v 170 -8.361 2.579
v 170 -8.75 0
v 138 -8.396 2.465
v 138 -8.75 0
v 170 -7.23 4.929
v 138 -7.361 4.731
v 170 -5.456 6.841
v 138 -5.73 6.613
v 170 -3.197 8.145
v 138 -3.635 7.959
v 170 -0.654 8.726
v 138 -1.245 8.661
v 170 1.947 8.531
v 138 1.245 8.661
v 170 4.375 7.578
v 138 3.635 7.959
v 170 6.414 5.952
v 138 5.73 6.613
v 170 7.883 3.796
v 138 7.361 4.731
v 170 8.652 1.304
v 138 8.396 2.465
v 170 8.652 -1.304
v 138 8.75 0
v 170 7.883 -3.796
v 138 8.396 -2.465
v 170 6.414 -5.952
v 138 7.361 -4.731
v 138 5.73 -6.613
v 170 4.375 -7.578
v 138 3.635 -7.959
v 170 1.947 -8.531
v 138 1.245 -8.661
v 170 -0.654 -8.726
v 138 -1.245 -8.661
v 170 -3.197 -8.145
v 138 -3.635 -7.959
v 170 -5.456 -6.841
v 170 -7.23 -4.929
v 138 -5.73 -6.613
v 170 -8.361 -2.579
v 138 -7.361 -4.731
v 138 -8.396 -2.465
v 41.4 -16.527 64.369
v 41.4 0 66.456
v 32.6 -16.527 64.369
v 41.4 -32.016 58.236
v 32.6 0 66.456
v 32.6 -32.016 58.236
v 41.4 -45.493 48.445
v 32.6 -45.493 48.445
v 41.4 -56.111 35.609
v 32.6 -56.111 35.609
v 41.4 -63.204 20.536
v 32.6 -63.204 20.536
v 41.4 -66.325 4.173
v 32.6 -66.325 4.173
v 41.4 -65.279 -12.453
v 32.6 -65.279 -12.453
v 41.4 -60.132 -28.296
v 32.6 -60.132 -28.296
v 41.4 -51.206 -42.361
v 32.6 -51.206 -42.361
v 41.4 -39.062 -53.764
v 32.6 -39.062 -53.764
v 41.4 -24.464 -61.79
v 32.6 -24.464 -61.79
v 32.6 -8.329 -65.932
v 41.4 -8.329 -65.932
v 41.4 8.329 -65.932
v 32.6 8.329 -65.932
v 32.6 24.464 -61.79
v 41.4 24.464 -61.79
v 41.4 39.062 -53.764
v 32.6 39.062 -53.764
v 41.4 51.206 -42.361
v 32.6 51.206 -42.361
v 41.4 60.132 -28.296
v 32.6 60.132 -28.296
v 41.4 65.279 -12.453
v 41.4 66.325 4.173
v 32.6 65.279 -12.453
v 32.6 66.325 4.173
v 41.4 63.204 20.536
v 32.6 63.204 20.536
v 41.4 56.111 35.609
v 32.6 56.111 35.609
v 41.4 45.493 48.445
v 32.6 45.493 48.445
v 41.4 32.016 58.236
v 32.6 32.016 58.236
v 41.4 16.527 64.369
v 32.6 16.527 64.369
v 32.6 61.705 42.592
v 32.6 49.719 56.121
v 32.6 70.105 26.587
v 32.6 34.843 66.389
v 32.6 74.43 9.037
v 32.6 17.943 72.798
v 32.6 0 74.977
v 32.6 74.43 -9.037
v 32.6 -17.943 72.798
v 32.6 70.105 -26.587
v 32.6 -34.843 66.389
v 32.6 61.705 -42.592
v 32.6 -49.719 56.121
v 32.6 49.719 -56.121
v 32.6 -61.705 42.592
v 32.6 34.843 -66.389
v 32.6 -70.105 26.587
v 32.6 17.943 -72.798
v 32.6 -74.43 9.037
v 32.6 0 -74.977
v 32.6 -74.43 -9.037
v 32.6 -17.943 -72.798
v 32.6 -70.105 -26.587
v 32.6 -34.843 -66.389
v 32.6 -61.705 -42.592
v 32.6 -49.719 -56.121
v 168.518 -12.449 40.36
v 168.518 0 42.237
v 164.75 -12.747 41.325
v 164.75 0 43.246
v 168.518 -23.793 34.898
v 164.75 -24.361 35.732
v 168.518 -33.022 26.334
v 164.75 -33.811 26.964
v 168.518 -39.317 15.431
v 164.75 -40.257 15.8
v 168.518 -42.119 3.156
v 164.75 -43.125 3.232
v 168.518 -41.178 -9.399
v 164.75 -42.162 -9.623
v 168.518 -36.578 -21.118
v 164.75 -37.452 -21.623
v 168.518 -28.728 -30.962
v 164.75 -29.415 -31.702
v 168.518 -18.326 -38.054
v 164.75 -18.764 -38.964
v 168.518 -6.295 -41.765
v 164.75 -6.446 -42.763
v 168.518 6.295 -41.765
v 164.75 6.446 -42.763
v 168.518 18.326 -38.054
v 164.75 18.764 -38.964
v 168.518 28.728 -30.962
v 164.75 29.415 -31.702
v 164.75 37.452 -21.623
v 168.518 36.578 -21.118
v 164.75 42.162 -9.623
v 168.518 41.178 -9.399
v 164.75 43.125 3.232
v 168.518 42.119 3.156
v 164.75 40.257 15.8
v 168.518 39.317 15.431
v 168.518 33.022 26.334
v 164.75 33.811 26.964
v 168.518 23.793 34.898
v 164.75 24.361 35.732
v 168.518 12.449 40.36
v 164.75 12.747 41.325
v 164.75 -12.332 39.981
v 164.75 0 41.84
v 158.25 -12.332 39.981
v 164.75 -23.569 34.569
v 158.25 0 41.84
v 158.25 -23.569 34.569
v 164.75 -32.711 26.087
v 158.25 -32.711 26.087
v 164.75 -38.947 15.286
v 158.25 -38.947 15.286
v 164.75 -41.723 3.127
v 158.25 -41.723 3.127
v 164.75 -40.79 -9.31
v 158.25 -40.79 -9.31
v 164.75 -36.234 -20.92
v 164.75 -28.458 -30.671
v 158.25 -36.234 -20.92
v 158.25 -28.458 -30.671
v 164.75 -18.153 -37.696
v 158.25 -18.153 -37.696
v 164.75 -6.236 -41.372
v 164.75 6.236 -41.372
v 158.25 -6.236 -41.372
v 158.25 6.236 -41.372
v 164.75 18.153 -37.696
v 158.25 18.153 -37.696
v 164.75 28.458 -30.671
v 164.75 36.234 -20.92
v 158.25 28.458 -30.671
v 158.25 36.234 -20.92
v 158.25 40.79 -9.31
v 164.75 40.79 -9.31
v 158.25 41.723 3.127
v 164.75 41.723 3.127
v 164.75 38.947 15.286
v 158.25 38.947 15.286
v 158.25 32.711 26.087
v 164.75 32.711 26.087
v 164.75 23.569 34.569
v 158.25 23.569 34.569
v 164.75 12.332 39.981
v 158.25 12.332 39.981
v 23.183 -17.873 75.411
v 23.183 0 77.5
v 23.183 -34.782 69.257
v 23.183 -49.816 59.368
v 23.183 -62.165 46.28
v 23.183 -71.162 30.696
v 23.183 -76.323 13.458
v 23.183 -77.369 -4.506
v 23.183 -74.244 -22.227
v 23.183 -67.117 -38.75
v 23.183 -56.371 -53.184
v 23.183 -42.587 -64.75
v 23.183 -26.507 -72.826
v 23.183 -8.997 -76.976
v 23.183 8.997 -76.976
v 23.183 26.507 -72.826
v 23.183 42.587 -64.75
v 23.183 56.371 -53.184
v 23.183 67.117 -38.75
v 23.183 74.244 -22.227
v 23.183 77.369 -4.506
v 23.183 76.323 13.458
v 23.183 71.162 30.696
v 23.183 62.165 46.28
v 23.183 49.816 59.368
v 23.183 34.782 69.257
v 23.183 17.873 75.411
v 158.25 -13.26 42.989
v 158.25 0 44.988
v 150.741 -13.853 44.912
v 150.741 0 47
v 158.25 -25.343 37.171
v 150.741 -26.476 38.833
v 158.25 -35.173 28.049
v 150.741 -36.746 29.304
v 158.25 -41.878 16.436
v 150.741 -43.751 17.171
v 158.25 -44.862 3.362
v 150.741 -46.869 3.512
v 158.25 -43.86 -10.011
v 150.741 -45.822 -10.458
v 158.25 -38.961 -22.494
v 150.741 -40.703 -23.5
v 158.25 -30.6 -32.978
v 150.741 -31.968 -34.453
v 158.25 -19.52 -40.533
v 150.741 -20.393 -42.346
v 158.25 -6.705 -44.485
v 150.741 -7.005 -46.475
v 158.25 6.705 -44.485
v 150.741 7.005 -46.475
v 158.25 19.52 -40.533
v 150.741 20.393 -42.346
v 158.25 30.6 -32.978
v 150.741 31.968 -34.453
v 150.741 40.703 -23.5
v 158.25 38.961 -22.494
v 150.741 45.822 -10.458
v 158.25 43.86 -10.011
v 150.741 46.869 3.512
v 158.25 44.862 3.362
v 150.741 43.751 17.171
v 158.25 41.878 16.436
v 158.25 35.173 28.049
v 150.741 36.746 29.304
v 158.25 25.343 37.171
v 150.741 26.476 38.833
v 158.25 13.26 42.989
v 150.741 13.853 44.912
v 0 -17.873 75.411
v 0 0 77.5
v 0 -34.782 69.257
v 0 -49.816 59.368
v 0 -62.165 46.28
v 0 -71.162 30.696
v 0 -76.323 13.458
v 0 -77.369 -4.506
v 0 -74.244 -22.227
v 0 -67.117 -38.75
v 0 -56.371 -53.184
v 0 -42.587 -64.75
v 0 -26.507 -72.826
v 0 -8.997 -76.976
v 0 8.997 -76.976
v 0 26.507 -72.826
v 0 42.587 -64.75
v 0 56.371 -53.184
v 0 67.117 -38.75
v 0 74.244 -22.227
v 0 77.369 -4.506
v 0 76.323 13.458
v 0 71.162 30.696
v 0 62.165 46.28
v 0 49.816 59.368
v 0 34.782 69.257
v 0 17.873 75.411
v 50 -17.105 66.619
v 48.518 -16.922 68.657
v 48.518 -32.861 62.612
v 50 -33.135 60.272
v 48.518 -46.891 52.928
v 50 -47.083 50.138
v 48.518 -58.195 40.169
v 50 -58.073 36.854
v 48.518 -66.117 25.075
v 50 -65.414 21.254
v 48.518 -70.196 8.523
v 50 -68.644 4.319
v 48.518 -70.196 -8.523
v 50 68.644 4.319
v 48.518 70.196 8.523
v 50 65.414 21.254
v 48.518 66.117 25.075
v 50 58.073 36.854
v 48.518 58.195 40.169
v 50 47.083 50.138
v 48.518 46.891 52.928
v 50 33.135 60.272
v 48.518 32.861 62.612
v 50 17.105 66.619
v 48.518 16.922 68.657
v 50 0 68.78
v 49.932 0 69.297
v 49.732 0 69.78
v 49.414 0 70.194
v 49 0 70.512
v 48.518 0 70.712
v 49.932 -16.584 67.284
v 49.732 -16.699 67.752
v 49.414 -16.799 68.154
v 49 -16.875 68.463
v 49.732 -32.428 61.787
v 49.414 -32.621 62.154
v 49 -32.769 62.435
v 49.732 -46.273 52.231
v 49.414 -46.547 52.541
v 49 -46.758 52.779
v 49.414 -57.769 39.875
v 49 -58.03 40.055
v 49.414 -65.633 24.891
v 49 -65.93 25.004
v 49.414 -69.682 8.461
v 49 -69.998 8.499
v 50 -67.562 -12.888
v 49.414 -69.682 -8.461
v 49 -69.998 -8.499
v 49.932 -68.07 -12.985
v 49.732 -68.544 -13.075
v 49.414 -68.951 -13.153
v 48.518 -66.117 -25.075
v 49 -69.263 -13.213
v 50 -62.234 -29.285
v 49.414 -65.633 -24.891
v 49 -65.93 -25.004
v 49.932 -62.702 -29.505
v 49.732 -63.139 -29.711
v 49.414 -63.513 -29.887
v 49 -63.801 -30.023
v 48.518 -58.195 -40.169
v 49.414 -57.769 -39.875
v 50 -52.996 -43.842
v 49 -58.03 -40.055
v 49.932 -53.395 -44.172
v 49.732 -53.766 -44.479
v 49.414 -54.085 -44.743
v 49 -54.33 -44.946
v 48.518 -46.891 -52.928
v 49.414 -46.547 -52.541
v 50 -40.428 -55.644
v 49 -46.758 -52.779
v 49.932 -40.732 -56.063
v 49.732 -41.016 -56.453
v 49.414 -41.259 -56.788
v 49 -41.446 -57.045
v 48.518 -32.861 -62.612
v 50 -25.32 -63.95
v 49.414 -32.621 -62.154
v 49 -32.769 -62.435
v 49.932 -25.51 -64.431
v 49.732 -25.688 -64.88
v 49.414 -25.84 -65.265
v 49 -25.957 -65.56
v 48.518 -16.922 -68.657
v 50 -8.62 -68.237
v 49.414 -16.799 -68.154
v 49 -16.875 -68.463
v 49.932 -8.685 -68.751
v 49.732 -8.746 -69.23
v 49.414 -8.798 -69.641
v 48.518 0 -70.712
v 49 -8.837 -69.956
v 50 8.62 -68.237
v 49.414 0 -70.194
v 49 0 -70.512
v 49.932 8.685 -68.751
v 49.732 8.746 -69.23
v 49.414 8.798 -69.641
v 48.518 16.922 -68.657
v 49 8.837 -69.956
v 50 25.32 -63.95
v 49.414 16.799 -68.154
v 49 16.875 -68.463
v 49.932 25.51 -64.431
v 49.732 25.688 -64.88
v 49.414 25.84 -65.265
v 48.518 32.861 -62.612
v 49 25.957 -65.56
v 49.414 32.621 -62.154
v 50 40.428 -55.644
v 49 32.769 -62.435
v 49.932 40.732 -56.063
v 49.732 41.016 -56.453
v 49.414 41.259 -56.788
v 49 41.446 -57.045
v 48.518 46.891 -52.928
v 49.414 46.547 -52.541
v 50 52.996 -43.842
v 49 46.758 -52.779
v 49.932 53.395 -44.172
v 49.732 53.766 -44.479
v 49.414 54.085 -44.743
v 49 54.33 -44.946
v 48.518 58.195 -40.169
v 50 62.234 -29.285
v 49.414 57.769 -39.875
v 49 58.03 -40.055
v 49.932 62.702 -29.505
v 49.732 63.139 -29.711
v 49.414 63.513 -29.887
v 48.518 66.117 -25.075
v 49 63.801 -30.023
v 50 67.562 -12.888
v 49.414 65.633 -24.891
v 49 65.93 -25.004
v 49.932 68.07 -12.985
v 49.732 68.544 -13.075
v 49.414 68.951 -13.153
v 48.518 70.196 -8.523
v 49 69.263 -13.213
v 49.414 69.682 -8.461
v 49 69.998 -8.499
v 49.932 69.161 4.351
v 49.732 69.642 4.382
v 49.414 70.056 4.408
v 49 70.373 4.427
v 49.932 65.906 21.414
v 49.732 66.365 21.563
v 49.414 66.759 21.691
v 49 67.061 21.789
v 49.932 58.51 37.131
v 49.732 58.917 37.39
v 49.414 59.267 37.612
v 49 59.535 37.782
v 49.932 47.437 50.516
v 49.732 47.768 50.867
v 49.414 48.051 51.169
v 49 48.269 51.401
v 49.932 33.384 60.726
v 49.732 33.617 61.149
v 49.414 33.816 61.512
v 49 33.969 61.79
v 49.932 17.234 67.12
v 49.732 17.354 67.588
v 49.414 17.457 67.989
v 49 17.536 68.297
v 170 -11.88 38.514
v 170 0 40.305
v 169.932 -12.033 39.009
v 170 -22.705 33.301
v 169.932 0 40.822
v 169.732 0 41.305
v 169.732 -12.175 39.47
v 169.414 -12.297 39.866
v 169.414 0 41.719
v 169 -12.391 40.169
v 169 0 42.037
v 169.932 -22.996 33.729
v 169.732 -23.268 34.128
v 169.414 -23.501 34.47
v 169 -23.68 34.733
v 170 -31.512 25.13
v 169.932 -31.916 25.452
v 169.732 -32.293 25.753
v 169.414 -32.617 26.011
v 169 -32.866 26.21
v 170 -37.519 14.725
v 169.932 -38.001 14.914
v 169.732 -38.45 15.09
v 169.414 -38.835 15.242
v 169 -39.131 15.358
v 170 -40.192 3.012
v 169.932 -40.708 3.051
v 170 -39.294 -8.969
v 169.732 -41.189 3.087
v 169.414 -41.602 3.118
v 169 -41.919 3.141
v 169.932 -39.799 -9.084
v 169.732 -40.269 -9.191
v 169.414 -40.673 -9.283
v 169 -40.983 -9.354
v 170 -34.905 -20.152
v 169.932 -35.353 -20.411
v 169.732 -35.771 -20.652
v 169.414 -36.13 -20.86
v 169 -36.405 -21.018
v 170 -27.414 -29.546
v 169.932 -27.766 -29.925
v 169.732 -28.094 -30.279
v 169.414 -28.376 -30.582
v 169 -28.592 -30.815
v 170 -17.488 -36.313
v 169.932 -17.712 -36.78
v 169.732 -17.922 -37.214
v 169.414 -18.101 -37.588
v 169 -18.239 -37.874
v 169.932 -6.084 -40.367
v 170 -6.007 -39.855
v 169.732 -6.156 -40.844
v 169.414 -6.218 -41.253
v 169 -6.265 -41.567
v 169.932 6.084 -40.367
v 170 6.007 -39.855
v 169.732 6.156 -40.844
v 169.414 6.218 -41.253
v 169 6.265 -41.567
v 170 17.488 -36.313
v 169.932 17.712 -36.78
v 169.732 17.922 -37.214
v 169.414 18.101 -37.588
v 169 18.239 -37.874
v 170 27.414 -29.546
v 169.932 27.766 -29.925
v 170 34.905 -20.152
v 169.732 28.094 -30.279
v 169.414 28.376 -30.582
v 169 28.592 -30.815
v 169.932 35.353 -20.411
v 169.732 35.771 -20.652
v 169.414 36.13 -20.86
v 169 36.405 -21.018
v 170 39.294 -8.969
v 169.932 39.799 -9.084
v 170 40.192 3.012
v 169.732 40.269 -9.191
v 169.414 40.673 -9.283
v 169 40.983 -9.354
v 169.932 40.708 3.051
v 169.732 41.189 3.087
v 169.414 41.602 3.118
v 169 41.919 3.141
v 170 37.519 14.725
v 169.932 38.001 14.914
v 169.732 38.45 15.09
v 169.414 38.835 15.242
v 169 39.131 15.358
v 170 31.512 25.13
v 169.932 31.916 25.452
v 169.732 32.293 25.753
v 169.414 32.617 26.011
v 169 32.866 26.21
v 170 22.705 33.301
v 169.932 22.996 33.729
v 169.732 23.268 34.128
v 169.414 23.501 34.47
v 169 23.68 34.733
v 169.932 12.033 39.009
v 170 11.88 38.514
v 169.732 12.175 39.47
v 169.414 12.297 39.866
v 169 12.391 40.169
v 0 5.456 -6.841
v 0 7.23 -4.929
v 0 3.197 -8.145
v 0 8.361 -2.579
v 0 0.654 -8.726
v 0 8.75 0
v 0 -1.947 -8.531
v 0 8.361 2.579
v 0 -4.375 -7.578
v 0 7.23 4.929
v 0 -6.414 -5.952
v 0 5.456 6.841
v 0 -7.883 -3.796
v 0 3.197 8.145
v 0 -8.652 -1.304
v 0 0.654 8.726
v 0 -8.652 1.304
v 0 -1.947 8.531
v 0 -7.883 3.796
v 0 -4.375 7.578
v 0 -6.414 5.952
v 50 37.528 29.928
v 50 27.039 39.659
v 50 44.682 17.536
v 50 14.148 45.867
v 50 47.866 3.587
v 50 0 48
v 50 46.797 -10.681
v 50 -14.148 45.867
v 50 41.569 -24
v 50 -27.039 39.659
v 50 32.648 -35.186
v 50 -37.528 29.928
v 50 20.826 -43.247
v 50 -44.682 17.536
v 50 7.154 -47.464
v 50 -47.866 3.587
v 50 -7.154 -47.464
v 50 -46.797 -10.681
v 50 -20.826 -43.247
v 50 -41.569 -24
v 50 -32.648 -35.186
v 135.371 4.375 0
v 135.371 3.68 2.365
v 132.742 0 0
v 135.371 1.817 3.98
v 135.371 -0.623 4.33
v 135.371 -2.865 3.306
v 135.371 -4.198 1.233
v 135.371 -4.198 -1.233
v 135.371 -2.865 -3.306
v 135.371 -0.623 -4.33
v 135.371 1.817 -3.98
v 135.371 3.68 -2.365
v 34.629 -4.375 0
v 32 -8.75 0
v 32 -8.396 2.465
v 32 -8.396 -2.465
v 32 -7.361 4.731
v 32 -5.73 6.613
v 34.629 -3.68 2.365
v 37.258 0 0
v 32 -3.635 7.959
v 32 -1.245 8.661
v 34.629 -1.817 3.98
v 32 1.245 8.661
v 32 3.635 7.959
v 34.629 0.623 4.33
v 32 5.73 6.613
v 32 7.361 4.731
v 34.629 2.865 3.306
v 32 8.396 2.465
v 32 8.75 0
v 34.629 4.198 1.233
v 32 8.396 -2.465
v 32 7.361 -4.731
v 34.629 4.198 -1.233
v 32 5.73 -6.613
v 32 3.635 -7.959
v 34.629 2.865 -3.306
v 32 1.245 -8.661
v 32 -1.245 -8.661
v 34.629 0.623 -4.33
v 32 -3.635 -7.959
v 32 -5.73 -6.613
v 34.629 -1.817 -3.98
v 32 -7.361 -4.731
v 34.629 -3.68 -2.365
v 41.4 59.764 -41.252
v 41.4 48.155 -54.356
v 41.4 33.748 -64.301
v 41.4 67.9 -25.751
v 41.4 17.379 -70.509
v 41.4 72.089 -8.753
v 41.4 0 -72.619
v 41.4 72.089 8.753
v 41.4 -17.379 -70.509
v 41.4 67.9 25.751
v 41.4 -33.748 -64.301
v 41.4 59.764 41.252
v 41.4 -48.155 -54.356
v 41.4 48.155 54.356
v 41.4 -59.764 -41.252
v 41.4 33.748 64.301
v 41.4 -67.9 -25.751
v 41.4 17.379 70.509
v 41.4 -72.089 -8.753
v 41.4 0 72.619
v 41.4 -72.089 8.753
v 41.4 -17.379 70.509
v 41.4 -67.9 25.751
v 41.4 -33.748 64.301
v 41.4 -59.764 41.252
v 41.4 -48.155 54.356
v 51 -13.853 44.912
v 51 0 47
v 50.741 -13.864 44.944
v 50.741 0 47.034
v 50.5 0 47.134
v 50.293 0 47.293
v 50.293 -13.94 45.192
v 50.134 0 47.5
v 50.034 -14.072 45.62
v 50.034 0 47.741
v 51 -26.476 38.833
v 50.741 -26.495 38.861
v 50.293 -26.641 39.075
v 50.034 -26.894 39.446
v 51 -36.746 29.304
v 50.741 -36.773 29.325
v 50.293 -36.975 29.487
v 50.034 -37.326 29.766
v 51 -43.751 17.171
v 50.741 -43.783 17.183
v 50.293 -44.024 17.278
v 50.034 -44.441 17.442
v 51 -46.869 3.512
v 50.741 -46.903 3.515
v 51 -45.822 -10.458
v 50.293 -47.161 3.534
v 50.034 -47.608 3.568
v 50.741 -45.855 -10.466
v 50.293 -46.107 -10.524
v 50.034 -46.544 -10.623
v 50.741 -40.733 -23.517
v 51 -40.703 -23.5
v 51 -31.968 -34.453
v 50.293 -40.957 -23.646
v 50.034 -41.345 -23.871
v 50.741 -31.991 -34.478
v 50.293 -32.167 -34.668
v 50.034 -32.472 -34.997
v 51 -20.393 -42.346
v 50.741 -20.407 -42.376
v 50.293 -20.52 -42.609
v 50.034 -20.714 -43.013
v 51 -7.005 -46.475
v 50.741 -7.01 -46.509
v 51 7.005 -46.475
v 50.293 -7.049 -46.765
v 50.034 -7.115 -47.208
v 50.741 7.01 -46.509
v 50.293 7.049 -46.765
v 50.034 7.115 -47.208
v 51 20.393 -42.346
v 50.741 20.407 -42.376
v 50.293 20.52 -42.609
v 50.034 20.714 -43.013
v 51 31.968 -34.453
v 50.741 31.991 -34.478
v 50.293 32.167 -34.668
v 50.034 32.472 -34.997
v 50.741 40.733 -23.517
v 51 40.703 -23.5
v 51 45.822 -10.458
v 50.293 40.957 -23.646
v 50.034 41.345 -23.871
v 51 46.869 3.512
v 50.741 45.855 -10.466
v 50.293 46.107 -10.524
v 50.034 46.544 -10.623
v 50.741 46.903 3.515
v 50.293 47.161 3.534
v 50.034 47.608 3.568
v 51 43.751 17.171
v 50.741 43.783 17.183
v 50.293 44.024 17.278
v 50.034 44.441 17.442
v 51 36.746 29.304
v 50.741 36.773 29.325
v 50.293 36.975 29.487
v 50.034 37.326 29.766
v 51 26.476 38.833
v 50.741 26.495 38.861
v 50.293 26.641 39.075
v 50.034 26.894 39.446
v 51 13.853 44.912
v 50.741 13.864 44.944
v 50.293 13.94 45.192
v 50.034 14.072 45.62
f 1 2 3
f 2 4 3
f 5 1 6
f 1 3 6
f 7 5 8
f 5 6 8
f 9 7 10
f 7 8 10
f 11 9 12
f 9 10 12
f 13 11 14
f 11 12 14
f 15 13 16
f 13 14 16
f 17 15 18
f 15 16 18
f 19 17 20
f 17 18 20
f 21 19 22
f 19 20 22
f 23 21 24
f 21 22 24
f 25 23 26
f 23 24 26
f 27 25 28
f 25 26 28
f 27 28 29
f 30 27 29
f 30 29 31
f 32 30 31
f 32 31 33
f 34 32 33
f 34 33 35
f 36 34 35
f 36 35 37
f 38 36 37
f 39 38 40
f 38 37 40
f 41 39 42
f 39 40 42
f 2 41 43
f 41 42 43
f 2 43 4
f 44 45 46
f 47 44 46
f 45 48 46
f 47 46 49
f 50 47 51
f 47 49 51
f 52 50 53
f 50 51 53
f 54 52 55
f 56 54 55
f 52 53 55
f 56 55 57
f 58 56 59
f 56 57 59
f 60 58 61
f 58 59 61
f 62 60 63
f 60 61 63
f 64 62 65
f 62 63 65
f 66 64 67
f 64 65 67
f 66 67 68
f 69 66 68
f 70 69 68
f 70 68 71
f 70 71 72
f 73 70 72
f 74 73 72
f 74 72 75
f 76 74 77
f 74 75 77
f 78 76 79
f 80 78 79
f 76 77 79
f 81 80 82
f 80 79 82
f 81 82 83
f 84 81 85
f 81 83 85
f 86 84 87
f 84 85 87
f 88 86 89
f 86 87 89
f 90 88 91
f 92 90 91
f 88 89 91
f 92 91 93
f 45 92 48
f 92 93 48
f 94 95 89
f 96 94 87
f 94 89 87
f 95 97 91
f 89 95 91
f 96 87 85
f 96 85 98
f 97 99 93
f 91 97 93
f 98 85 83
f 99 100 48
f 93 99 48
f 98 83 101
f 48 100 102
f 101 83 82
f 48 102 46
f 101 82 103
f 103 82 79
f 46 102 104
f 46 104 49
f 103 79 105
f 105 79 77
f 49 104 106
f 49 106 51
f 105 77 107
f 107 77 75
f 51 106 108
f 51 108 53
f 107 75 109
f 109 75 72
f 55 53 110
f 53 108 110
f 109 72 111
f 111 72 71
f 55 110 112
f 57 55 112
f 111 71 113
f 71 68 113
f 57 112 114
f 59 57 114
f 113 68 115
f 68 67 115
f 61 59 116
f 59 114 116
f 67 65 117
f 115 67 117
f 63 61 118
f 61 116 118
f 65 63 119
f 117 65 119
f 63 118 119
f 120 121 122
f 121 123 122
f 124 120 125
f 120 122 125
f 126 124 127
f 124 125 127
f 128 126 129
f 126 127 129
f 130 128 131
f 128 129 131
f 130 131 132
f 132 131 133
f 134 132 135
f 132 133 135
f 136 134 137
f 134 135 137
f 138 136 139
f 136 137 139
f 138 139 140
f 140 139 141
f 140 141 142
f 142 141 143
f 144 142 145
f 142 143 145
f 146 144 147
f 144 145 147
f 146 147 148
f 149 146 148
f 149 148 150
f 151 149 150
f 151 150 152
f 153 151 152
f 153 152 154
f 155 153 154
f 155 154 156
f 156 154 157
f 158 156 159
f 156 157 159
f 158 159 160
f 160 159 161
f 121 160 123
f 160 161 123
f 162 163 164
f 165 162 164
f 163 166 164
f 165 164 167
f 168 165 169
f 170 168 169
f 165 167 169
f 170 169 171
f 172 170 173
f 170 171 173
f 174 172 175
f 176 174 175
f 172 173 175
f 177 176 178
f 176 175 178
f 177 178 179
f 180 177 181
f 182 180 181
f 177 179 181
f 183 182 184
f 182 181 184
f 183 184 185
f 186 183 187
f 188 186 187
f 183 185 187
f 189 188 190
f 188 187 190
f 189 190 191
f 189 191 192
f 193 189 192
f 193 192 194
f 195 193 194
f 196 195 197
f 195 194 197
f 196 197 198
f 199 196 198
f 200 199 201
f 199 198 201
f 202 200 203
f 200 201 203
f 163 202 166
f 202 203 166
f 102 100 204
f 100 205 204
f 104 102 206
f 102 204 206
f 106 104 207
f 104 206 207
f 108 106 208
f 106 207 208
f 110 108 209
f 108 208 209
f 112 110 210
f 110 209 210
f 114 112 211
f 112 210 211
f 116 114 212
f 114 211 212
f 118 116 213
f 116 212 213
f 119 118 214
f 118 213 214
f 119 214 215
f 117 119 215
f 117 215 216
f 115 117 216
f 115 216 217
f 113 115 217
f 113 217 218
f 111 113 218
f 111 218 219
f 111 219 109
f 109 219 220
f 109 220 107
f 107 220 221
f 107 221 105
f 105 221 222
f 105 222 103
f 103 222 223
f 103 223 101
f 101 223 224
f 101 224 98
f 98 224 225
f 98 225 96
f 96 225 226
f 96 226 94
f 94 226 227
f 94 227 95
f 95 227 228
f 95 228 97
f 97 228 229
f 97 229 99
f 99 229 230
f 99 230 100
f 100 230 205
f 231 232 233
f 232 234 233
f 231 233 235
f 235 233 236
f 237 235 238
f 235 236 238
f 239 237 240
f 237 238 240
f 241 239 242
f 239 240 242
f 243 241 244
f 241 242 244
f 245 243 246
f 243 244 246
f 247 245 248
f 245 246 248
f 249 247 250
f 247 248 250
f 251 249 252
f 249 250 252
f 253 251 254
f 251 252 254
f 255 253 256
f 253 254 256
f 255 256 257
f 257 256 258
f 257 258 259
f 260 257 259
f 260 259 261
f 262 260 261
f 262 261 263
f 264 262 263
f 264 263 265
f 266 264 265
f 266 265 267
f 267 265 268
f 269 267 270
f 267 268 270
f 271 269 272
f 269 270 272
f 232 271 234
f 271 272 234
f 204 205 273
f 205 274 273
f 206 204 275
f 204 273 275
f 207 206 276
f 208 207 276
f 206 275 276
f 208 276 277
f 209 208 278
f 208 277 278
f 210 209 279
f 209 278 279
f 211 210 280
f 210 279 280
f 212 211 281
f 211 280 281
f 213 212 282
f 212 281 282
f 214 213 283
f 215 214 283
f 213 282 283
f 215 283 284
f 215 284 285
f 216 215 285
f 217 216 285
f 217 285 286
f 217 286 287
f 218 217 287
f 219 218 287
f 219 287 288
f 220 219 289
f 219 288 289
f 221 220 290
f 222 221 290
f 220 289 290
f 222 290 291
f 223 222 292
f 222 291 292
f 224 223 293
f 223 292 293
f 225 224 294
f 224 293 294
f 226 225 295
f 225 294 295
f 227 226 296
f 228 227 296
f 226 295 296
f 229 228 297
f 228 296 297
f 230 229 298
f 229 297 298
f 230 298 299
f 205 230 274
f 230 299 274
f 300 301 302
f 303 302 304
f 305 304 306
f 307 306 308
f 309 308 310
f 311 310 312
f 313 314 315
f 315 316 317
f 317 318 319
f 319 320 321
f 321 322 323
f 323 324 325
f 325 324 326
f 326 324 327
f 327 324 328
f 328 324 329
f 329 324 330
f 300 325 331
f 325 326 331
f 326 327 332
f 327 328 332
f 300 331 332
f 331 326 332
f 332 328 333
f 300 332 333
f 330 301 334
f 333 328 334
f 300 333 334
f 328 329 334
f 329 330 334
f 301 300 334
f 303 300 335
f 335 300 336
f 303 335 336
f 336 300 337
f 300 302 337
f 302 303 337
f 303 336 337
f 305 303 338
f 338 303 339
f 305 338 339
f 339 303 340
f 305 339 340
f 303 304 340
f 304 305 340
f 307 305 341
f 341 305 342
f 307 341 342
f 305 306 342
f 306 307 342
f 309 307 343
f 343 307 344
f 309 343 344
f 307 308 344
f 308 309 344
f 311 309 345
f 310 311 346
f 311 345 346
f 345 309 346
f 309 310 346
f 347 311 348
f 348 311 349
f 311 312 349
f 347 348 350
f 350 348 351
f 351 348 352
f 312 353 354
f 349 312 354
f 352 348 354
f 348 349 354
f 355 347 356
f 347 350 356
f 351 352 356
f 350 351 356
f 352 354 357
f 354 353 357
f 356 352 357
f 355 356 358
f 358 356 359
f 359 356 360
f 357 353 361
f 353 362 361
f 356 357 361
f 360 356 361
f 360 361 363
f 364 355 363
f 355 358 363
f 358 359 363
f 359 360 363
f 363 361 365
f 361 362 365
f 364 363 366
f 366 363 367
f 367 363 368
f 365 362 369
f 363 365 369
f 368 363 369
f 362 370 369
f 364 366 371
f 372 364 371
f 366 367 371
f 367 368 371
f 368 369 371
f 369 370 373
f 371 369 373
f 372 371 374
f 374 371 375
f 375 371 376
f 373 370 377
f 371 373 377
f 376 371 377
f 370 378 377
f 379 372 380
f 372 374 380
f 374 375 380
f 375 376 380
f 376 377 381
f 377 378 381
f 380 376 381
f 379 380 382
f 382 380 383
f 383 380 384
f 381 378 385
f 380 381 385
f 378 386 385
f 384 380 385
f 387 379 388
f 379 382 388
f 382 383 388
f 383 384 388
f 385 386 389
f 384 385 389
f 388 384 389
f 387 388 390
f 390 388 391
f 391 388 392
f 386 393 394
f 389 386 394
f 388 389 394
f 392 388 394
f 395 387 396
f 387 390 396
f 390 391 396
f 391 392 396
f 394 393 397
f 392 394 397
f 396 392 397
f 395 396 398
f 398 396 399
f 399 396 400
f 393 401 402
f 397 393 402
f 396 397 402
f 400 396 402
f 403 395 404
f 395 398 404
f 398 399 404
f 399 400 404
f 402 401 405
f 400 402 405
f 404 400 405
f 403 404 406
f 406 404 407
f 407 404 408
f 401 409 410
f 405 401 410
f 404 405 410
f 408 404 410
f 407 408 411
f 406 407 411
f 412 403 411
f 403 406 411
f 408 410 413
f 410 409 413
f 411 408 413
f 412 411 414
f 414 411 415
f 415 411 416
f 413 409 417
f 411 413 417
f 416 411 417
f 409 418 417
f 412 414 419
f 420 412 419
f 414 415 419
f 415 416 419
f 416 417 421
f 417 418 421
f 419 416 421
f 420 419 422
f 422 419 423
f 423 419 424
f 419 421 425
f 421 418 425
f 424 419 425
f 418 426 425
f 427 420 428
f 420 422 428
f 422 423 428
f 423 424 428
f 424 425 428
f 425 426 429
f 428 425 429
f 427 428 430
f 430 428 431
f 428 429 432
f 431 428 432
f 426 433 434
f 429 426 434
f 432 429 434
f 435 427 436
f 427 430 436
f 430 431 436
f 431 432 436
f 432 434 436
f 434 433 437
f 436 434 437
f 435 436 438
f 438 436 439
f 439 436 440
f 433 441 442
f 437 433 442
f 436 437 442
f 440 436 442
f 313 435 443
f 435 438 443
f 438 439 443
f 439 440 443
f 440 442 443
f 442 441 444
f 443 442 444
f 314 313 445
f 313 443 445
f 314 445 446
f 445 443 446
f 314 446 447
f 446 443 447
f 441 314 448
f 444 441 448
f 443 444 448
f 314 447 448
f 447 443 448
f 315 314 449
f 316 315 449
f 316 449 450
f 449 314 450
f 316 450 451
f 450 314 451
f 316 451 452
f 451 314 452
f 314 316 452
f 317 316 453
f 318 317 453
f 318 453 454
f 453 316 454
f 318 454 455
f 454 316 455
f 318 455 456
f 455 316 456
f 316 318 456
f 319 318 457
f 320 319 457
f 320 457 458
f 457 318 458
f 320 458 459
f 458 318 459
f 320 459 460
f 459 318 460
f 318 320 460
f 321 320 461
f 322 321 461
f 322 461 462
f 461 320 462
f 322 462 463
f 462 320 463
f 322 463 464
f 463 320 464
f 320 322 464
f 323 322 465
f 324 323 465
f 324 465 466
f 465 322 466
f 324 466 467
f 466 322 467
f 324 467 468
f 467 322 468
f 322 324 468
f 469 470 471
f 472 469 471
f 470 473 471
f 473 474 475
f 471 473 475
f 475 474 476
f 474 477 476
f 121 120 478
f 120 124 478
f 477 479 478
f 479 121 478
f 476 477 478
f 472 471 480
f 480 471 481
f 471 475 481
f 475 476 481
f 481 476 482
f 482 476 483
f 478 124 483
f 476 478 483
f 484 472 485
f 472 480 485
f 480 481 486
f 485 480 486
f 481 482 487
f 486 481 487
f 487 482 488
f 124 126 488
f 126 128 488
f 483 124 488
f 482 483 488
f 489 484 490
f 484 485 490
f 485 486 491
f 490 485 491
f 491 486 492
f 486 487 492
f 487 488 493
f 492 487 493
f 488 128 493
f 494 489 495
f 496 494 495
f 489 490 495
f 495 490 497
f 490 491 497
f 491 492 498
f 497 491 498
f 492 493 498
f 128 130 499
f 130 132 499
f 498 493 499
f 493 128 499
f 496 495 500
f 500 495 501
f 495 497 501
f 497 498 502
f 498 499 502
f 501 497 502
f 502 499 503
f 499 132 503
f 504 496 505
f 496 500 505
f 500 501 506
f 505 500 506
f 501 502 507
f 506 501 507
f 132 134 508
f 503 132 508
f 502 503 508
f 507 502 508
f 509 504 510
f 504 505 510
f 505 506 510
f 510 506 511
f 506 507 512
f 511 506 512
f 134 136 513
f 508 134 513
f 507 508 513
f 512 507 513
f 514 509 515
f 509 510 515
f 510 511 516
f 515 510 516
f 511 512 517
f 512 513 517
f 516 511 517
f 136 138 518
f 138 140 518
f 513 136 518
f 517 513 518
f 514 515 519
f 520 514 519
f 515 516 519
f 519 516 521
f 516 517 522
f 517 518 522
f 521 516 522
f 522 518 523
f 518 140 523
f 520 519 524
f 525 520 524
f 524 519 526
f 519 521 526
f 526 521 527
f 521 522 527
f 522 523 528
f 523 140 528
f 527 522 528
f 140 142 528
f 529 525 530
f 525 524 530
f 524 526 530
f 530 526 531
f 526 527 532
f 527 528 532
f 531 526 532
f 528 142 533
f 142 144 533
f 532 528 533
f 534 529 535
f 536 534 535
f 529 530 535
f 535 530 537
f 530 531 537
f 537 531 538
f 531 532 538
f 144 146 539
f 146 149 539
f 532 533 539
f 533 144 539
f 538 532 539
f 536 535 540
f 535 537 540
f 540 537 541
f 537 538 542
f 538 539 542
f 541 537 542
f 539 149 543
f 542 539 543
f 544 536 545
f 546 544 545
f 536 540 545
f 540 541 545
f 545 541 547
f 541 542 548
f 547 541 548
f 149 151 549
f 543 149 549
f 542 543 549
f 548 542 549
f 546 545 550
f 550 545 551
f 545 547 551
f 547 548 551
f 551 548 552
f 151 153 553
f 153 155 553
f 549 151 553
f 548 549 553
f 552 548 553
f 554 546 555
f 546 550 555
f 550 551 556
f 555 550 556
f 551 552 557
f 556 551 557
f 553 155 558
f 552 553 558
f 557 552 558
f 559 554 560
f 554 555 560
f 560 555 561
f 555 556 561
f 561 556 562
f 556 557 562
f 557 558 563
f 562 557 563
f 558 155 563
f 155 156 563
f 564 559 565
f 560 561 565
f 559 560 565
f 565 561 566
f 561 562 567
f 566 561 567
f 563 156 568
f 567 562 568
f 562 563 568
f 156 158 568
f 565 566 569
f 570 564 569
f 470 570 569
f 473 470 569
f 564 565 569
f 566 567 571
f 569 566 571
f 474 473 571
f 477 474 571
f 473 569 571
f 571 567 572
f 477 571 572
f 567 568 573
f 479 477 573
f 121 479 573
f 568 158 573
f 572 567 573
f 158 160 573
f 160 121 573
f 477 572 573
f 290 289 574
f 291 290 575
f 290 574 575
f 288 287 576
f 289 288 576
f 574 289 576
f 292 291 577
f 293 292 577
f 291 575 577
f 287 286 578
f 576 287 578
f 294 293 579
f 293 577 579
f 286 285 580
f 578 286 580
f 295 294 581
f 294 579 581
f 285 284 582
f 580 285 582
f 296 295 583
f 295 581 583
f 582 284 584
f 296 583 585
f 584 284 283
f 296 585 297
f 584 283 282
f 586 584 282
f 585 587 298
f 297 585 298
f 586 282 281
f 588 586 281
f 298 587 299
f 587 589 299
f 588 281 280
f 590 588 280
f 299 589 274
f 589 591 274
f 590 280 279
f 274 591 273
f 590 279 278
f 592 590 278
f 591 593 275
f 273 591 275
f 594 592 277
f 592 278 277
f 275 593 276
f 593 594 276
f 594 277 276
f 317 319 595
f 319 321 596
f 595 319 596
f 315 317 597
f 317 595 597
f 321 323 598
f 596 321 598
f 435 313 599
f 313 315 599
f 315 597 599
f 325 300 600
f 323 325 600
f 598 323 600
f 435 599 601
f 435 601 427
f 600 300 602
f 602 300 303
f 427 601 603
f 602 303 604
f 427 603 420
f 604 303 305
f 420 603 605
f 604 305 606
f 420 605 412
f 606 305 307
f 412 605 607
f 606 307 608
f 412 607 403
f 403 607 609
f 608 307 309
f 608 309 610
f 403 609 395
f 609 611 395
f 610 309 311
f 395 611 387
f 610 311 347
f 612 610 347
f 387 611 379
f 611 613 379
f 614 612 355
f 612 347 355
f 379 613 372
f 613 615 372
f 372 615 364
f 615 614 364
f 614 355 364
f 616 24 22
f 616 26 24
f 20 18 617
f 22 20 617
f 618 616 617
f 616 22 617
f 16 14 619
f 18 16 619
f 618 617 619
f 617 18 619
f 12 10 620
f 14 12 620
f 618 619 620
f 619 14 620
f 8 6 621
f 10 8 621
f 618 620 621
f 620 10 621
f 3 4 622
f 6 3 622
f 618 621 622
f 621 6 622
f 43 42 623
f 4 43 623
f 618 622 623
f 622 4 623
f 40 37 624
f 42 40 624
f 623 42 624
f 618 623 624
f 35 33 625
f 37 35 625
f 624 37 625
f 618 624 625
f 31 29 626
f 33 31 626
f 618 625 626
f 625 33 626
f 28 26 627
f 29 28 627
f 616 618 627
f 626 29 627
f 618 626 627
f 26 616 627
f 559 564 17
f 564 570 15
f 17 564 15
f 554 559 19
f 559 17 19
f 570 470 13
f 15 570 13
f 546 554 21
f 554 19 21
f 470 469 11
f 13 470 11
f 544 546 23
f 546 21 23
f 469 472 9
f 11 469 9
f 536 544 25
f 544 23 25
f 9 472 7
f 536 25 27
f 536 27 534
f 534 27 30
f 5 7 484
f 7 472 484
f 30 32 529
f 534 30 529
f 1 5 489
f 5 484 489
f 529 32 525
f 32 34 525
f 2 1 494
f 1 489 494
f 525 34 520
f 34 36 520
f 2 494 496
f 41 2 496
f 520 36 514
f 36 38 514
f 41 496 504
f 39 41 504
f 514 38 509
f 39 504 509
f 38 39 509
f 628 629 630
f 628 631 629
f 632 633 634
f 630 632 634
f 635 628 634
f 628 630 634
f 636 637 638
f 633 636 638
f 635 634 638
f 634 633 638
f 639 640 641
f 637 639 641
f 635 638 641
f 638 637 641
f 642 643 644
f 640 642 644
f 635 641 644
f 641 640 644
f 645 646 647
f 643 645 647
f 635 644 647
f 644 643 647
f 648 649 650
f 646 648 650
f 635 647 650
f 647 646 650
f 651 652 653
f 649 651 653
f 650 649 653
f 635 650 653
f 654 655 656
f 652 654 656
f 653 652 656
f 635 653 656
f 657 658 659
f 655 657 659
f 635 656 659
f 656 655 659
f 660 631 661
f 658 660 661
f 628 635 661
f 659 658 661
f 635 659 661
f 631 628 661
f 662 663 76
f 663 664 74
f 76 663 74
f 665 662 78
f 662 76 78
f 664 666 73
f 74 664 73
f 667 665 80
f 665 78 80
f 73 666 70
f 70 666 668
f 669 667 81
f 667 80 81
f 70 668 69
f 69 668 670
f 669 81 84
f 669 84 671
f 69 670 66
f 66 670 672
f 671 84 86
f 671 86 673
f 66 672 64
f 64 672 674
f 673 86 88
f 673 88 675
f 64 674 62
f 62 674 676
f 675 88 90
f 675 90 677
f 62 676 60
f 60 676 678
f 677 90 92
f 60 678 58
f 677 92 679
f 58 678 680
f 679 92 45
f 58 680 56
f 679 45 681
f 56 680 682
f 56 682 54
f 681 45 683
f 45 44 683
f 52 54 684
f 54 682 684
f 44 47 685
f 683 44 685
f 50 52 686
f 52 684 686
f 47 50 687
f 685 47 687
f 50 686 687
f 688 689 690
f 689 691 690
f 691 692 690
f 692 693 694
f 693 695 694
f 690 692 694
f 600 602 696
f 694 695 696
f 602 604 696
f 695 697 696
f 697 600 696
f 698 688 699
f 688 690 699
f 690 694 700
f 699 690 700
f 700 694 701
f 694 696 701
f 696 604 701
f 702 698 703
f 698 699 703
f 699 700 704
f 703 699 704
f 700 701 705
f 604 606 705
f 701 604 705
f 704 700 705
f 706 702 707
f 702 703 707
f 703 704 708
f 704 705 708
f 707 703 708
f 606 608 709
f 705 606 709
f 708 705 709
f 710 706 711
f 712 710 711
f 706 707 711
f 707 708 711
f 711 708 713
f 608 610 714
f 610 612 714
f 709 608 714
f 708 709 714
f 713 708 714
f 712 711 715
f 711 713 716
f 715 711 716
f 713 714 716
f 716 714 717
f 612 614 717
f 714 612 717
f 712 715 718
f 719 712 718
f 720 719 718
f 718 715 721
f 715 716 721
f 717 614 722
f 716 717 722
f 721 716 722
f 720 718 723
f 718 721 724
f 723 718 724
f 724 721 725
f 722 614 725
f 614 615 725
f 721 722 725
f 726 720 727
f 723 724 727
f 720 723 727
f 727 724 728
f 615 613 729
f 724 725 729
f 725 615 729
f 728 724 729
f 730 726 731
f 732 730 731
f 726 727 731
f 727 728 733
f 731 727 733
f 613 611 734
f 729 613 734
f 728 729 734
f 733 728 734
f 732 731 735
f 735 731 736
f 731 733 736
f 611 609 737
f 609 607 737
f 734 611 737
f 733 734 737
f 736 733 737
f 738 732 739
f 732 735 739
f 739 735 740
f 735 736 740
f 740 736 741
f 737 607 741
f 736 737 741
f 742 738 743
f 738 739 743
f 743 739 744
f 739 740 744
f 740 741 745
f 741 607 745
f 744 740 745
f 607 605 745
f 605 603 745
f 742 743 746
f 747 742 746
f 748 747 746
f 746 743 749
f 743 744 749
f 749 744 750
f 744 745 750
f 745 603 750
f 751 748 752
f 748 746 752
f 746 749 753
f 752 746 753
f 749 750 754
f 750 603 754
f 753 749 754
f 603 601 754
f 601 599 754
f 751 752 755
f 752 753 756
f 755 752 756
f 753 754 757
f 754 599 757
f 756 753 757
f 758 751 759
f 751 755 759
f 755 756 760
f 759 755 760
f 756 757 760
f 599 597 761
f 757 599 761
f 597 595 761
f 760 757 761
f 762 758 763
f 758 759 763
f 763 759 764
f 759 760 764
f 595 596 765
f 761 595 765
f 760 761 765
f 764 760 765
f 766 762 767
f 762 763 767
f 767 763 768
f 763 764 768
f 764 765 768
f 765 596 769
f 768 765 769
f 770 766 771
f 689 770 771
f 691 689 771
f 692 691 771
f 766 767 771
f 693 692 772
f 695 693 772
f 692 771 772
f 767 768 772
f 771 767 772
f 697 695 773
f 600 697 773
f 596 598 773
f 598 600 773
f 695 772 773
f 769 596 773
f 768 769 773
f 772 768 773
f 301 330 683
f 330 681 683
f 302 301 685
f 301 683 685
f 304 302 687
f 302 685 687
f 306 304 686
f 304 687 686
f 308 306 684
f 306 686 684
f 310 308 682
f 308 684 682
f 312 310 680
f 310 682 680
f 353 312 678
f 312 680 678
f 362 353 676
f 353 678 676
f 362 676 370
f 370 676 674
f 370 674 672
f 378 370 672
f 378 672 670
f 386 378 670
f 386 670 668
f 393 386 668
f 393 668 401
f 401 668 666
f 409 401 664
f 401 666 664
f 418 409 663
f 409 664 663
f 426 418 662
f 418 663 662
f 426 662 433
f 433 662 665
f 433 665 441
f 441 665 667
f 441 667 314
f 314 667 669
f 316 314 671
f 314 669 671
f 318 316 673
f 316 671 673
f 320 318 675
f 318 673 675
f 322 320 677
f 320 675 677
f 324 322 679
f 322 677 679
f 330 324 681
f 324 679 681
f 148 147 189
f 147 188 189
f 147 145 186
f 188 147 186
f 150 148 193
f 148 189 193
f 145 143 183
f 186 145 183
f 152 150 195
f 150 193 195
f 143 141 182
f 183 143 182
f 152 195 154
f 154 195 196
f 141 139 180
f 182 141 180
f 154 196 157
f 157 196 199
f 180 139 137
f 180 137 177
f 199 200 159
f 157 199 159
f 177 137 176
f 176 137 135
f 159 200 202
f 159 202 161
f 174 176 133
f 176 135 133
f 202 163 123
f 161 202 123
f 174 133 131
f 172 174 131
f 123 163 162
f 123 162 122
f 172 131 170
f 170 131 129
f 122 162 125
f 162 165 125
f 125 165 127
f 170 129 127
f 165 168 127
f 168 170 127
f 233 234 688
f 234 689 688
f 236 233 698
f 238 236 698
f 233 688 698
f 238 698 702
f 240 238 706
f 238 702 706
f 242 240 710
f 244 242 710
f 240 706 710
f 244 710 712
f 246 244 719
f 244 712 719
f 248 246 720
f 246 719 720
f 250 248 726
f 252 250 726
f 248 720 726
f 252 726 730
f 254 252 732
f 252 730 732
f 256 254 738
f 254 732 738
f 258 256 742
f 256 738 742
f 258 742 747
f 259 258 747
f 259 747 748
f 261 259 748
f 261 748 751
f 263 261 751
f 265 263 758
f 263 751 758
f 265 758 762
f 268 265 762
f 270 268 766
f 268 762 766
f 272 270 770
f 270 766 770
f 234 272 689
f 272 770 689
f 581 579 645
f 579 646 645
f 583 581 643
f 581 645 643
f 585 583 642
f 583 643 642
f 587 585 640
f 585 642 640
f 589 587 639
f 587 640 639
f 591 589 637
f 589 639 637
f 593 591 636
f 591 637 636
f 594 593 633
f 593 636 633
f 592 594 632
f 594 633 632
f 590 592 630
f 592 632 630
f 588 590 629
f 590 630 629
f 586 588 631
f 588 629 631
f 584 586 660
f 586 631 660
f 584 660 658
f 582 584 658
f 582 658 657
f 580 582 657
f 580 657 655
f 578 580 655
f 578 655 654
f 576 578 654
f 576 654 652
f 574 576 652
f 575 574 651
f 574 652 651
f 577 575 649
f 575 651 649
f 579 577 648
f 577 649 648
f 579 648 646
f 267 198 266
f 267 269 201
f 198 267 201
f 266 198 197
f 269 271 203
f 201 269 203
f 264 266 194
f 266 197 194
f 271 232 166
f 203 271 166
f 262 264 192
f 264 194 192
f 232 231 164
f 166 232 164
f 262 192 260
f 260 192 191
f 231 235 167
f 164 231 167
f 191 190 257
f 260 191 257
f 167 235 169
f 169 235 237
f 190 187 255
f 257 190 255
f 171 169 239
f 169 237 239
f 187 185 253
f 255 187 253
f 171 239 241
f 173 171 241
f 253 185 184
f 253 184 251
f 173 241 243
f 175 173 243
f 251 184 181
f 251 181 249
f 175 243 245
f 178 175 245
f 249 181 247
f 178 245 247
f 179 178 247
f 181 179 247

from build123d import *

# Parameters (mm, degrees)
F3_D     = 17.5
F3_DEPTH = 32
F3_TIP   = 5.2575304165
F5_D     = 17.5
F5_DEPTH = 32
F5_TIP   = 5.2575304165


with BuildPart() as f1:
    # F0 (on Front) → F1 (revolve)
    with BuildSketch(Plane.XZ):
        with BuildLine():
            Line((0, 77.5), (0, 0))
            Line((0, 0), (170, 0))
            Line((170, 0), (170, 40.304846024))
            ThreePointArc((170, 40.304846024), (169.5867066806, 41.5223688821), (168.5176380902, 42.2366976766))
            Line((168.5176380902, 42.2366976766), (164.75, 43.2462332603))
            Line((164.75, 43.2462332603), (164.75, 41.8395))
            Line((164.75, 41.8395), (158.25, 41.8395))
            Line((158.25, 41.8395), (158.25, 44.9879030111))
            Line((158.25, 44.9879030111), (150.7407518075, 47))
            Line((150.7407518075, 47), (51, 47))
            ThreePointArc((51, 47), (50.2928932188, 47.2928932188), (50, 48))
            Line((50, 48), (50, 68.7798354631))
            ThreePointArc((50, 68.7798354631), (49.5867066806, 69.9973583211), (48.5176380902, 70.7116871157))
            Line((48.5176380902, 70.7116871157), (41.4, 72.6188524939))
            Line((41.4, 72.6188524939), (41.4, 66.4565))
            Line((41.4, 66.4565), (32.6, 66.4565))
            Line((32.6, 66.4565), (32.6, 74.9768053873))
            Line((32.6, 74.9768053873), (23.1833095082, 77.5))
            Line((23.1833095082, 77.5), (0, 77.5))
        make_face()
    revolve(axis=Axis((85, 0, 0), (1, 0, 0)))

    # F3
    with Locations(Plane(origin=(0, 0, 0), x_dir=(0, -1, 0), z_dir=(-1, 0, 0))):
        with Locations((0, 0)):
            Hole(F3_D / 2, depth=F3_DEPTH)
            with Locations((0, 0, -(F3_DEPTH + F3_TIP / 2))):  # 118° drill point
                Cone(0, F3_D / 2, F3_TIP, mode=Mode.SUBTRACT)

    # F5
    with Locations(Plane.YZ.offset(170)):
        with Locations((0, 0)):
            Hole(F5_D / 2, depth=F5_DEPTH)
            with Locations((0, 0, -(F5_DEPTH + F5_TIP / 2))):  # 118° drill point
                Cone(0, F5_D / 2, F5_TIP, mode=Mode.SUBTRACT)


solid = f1.part
